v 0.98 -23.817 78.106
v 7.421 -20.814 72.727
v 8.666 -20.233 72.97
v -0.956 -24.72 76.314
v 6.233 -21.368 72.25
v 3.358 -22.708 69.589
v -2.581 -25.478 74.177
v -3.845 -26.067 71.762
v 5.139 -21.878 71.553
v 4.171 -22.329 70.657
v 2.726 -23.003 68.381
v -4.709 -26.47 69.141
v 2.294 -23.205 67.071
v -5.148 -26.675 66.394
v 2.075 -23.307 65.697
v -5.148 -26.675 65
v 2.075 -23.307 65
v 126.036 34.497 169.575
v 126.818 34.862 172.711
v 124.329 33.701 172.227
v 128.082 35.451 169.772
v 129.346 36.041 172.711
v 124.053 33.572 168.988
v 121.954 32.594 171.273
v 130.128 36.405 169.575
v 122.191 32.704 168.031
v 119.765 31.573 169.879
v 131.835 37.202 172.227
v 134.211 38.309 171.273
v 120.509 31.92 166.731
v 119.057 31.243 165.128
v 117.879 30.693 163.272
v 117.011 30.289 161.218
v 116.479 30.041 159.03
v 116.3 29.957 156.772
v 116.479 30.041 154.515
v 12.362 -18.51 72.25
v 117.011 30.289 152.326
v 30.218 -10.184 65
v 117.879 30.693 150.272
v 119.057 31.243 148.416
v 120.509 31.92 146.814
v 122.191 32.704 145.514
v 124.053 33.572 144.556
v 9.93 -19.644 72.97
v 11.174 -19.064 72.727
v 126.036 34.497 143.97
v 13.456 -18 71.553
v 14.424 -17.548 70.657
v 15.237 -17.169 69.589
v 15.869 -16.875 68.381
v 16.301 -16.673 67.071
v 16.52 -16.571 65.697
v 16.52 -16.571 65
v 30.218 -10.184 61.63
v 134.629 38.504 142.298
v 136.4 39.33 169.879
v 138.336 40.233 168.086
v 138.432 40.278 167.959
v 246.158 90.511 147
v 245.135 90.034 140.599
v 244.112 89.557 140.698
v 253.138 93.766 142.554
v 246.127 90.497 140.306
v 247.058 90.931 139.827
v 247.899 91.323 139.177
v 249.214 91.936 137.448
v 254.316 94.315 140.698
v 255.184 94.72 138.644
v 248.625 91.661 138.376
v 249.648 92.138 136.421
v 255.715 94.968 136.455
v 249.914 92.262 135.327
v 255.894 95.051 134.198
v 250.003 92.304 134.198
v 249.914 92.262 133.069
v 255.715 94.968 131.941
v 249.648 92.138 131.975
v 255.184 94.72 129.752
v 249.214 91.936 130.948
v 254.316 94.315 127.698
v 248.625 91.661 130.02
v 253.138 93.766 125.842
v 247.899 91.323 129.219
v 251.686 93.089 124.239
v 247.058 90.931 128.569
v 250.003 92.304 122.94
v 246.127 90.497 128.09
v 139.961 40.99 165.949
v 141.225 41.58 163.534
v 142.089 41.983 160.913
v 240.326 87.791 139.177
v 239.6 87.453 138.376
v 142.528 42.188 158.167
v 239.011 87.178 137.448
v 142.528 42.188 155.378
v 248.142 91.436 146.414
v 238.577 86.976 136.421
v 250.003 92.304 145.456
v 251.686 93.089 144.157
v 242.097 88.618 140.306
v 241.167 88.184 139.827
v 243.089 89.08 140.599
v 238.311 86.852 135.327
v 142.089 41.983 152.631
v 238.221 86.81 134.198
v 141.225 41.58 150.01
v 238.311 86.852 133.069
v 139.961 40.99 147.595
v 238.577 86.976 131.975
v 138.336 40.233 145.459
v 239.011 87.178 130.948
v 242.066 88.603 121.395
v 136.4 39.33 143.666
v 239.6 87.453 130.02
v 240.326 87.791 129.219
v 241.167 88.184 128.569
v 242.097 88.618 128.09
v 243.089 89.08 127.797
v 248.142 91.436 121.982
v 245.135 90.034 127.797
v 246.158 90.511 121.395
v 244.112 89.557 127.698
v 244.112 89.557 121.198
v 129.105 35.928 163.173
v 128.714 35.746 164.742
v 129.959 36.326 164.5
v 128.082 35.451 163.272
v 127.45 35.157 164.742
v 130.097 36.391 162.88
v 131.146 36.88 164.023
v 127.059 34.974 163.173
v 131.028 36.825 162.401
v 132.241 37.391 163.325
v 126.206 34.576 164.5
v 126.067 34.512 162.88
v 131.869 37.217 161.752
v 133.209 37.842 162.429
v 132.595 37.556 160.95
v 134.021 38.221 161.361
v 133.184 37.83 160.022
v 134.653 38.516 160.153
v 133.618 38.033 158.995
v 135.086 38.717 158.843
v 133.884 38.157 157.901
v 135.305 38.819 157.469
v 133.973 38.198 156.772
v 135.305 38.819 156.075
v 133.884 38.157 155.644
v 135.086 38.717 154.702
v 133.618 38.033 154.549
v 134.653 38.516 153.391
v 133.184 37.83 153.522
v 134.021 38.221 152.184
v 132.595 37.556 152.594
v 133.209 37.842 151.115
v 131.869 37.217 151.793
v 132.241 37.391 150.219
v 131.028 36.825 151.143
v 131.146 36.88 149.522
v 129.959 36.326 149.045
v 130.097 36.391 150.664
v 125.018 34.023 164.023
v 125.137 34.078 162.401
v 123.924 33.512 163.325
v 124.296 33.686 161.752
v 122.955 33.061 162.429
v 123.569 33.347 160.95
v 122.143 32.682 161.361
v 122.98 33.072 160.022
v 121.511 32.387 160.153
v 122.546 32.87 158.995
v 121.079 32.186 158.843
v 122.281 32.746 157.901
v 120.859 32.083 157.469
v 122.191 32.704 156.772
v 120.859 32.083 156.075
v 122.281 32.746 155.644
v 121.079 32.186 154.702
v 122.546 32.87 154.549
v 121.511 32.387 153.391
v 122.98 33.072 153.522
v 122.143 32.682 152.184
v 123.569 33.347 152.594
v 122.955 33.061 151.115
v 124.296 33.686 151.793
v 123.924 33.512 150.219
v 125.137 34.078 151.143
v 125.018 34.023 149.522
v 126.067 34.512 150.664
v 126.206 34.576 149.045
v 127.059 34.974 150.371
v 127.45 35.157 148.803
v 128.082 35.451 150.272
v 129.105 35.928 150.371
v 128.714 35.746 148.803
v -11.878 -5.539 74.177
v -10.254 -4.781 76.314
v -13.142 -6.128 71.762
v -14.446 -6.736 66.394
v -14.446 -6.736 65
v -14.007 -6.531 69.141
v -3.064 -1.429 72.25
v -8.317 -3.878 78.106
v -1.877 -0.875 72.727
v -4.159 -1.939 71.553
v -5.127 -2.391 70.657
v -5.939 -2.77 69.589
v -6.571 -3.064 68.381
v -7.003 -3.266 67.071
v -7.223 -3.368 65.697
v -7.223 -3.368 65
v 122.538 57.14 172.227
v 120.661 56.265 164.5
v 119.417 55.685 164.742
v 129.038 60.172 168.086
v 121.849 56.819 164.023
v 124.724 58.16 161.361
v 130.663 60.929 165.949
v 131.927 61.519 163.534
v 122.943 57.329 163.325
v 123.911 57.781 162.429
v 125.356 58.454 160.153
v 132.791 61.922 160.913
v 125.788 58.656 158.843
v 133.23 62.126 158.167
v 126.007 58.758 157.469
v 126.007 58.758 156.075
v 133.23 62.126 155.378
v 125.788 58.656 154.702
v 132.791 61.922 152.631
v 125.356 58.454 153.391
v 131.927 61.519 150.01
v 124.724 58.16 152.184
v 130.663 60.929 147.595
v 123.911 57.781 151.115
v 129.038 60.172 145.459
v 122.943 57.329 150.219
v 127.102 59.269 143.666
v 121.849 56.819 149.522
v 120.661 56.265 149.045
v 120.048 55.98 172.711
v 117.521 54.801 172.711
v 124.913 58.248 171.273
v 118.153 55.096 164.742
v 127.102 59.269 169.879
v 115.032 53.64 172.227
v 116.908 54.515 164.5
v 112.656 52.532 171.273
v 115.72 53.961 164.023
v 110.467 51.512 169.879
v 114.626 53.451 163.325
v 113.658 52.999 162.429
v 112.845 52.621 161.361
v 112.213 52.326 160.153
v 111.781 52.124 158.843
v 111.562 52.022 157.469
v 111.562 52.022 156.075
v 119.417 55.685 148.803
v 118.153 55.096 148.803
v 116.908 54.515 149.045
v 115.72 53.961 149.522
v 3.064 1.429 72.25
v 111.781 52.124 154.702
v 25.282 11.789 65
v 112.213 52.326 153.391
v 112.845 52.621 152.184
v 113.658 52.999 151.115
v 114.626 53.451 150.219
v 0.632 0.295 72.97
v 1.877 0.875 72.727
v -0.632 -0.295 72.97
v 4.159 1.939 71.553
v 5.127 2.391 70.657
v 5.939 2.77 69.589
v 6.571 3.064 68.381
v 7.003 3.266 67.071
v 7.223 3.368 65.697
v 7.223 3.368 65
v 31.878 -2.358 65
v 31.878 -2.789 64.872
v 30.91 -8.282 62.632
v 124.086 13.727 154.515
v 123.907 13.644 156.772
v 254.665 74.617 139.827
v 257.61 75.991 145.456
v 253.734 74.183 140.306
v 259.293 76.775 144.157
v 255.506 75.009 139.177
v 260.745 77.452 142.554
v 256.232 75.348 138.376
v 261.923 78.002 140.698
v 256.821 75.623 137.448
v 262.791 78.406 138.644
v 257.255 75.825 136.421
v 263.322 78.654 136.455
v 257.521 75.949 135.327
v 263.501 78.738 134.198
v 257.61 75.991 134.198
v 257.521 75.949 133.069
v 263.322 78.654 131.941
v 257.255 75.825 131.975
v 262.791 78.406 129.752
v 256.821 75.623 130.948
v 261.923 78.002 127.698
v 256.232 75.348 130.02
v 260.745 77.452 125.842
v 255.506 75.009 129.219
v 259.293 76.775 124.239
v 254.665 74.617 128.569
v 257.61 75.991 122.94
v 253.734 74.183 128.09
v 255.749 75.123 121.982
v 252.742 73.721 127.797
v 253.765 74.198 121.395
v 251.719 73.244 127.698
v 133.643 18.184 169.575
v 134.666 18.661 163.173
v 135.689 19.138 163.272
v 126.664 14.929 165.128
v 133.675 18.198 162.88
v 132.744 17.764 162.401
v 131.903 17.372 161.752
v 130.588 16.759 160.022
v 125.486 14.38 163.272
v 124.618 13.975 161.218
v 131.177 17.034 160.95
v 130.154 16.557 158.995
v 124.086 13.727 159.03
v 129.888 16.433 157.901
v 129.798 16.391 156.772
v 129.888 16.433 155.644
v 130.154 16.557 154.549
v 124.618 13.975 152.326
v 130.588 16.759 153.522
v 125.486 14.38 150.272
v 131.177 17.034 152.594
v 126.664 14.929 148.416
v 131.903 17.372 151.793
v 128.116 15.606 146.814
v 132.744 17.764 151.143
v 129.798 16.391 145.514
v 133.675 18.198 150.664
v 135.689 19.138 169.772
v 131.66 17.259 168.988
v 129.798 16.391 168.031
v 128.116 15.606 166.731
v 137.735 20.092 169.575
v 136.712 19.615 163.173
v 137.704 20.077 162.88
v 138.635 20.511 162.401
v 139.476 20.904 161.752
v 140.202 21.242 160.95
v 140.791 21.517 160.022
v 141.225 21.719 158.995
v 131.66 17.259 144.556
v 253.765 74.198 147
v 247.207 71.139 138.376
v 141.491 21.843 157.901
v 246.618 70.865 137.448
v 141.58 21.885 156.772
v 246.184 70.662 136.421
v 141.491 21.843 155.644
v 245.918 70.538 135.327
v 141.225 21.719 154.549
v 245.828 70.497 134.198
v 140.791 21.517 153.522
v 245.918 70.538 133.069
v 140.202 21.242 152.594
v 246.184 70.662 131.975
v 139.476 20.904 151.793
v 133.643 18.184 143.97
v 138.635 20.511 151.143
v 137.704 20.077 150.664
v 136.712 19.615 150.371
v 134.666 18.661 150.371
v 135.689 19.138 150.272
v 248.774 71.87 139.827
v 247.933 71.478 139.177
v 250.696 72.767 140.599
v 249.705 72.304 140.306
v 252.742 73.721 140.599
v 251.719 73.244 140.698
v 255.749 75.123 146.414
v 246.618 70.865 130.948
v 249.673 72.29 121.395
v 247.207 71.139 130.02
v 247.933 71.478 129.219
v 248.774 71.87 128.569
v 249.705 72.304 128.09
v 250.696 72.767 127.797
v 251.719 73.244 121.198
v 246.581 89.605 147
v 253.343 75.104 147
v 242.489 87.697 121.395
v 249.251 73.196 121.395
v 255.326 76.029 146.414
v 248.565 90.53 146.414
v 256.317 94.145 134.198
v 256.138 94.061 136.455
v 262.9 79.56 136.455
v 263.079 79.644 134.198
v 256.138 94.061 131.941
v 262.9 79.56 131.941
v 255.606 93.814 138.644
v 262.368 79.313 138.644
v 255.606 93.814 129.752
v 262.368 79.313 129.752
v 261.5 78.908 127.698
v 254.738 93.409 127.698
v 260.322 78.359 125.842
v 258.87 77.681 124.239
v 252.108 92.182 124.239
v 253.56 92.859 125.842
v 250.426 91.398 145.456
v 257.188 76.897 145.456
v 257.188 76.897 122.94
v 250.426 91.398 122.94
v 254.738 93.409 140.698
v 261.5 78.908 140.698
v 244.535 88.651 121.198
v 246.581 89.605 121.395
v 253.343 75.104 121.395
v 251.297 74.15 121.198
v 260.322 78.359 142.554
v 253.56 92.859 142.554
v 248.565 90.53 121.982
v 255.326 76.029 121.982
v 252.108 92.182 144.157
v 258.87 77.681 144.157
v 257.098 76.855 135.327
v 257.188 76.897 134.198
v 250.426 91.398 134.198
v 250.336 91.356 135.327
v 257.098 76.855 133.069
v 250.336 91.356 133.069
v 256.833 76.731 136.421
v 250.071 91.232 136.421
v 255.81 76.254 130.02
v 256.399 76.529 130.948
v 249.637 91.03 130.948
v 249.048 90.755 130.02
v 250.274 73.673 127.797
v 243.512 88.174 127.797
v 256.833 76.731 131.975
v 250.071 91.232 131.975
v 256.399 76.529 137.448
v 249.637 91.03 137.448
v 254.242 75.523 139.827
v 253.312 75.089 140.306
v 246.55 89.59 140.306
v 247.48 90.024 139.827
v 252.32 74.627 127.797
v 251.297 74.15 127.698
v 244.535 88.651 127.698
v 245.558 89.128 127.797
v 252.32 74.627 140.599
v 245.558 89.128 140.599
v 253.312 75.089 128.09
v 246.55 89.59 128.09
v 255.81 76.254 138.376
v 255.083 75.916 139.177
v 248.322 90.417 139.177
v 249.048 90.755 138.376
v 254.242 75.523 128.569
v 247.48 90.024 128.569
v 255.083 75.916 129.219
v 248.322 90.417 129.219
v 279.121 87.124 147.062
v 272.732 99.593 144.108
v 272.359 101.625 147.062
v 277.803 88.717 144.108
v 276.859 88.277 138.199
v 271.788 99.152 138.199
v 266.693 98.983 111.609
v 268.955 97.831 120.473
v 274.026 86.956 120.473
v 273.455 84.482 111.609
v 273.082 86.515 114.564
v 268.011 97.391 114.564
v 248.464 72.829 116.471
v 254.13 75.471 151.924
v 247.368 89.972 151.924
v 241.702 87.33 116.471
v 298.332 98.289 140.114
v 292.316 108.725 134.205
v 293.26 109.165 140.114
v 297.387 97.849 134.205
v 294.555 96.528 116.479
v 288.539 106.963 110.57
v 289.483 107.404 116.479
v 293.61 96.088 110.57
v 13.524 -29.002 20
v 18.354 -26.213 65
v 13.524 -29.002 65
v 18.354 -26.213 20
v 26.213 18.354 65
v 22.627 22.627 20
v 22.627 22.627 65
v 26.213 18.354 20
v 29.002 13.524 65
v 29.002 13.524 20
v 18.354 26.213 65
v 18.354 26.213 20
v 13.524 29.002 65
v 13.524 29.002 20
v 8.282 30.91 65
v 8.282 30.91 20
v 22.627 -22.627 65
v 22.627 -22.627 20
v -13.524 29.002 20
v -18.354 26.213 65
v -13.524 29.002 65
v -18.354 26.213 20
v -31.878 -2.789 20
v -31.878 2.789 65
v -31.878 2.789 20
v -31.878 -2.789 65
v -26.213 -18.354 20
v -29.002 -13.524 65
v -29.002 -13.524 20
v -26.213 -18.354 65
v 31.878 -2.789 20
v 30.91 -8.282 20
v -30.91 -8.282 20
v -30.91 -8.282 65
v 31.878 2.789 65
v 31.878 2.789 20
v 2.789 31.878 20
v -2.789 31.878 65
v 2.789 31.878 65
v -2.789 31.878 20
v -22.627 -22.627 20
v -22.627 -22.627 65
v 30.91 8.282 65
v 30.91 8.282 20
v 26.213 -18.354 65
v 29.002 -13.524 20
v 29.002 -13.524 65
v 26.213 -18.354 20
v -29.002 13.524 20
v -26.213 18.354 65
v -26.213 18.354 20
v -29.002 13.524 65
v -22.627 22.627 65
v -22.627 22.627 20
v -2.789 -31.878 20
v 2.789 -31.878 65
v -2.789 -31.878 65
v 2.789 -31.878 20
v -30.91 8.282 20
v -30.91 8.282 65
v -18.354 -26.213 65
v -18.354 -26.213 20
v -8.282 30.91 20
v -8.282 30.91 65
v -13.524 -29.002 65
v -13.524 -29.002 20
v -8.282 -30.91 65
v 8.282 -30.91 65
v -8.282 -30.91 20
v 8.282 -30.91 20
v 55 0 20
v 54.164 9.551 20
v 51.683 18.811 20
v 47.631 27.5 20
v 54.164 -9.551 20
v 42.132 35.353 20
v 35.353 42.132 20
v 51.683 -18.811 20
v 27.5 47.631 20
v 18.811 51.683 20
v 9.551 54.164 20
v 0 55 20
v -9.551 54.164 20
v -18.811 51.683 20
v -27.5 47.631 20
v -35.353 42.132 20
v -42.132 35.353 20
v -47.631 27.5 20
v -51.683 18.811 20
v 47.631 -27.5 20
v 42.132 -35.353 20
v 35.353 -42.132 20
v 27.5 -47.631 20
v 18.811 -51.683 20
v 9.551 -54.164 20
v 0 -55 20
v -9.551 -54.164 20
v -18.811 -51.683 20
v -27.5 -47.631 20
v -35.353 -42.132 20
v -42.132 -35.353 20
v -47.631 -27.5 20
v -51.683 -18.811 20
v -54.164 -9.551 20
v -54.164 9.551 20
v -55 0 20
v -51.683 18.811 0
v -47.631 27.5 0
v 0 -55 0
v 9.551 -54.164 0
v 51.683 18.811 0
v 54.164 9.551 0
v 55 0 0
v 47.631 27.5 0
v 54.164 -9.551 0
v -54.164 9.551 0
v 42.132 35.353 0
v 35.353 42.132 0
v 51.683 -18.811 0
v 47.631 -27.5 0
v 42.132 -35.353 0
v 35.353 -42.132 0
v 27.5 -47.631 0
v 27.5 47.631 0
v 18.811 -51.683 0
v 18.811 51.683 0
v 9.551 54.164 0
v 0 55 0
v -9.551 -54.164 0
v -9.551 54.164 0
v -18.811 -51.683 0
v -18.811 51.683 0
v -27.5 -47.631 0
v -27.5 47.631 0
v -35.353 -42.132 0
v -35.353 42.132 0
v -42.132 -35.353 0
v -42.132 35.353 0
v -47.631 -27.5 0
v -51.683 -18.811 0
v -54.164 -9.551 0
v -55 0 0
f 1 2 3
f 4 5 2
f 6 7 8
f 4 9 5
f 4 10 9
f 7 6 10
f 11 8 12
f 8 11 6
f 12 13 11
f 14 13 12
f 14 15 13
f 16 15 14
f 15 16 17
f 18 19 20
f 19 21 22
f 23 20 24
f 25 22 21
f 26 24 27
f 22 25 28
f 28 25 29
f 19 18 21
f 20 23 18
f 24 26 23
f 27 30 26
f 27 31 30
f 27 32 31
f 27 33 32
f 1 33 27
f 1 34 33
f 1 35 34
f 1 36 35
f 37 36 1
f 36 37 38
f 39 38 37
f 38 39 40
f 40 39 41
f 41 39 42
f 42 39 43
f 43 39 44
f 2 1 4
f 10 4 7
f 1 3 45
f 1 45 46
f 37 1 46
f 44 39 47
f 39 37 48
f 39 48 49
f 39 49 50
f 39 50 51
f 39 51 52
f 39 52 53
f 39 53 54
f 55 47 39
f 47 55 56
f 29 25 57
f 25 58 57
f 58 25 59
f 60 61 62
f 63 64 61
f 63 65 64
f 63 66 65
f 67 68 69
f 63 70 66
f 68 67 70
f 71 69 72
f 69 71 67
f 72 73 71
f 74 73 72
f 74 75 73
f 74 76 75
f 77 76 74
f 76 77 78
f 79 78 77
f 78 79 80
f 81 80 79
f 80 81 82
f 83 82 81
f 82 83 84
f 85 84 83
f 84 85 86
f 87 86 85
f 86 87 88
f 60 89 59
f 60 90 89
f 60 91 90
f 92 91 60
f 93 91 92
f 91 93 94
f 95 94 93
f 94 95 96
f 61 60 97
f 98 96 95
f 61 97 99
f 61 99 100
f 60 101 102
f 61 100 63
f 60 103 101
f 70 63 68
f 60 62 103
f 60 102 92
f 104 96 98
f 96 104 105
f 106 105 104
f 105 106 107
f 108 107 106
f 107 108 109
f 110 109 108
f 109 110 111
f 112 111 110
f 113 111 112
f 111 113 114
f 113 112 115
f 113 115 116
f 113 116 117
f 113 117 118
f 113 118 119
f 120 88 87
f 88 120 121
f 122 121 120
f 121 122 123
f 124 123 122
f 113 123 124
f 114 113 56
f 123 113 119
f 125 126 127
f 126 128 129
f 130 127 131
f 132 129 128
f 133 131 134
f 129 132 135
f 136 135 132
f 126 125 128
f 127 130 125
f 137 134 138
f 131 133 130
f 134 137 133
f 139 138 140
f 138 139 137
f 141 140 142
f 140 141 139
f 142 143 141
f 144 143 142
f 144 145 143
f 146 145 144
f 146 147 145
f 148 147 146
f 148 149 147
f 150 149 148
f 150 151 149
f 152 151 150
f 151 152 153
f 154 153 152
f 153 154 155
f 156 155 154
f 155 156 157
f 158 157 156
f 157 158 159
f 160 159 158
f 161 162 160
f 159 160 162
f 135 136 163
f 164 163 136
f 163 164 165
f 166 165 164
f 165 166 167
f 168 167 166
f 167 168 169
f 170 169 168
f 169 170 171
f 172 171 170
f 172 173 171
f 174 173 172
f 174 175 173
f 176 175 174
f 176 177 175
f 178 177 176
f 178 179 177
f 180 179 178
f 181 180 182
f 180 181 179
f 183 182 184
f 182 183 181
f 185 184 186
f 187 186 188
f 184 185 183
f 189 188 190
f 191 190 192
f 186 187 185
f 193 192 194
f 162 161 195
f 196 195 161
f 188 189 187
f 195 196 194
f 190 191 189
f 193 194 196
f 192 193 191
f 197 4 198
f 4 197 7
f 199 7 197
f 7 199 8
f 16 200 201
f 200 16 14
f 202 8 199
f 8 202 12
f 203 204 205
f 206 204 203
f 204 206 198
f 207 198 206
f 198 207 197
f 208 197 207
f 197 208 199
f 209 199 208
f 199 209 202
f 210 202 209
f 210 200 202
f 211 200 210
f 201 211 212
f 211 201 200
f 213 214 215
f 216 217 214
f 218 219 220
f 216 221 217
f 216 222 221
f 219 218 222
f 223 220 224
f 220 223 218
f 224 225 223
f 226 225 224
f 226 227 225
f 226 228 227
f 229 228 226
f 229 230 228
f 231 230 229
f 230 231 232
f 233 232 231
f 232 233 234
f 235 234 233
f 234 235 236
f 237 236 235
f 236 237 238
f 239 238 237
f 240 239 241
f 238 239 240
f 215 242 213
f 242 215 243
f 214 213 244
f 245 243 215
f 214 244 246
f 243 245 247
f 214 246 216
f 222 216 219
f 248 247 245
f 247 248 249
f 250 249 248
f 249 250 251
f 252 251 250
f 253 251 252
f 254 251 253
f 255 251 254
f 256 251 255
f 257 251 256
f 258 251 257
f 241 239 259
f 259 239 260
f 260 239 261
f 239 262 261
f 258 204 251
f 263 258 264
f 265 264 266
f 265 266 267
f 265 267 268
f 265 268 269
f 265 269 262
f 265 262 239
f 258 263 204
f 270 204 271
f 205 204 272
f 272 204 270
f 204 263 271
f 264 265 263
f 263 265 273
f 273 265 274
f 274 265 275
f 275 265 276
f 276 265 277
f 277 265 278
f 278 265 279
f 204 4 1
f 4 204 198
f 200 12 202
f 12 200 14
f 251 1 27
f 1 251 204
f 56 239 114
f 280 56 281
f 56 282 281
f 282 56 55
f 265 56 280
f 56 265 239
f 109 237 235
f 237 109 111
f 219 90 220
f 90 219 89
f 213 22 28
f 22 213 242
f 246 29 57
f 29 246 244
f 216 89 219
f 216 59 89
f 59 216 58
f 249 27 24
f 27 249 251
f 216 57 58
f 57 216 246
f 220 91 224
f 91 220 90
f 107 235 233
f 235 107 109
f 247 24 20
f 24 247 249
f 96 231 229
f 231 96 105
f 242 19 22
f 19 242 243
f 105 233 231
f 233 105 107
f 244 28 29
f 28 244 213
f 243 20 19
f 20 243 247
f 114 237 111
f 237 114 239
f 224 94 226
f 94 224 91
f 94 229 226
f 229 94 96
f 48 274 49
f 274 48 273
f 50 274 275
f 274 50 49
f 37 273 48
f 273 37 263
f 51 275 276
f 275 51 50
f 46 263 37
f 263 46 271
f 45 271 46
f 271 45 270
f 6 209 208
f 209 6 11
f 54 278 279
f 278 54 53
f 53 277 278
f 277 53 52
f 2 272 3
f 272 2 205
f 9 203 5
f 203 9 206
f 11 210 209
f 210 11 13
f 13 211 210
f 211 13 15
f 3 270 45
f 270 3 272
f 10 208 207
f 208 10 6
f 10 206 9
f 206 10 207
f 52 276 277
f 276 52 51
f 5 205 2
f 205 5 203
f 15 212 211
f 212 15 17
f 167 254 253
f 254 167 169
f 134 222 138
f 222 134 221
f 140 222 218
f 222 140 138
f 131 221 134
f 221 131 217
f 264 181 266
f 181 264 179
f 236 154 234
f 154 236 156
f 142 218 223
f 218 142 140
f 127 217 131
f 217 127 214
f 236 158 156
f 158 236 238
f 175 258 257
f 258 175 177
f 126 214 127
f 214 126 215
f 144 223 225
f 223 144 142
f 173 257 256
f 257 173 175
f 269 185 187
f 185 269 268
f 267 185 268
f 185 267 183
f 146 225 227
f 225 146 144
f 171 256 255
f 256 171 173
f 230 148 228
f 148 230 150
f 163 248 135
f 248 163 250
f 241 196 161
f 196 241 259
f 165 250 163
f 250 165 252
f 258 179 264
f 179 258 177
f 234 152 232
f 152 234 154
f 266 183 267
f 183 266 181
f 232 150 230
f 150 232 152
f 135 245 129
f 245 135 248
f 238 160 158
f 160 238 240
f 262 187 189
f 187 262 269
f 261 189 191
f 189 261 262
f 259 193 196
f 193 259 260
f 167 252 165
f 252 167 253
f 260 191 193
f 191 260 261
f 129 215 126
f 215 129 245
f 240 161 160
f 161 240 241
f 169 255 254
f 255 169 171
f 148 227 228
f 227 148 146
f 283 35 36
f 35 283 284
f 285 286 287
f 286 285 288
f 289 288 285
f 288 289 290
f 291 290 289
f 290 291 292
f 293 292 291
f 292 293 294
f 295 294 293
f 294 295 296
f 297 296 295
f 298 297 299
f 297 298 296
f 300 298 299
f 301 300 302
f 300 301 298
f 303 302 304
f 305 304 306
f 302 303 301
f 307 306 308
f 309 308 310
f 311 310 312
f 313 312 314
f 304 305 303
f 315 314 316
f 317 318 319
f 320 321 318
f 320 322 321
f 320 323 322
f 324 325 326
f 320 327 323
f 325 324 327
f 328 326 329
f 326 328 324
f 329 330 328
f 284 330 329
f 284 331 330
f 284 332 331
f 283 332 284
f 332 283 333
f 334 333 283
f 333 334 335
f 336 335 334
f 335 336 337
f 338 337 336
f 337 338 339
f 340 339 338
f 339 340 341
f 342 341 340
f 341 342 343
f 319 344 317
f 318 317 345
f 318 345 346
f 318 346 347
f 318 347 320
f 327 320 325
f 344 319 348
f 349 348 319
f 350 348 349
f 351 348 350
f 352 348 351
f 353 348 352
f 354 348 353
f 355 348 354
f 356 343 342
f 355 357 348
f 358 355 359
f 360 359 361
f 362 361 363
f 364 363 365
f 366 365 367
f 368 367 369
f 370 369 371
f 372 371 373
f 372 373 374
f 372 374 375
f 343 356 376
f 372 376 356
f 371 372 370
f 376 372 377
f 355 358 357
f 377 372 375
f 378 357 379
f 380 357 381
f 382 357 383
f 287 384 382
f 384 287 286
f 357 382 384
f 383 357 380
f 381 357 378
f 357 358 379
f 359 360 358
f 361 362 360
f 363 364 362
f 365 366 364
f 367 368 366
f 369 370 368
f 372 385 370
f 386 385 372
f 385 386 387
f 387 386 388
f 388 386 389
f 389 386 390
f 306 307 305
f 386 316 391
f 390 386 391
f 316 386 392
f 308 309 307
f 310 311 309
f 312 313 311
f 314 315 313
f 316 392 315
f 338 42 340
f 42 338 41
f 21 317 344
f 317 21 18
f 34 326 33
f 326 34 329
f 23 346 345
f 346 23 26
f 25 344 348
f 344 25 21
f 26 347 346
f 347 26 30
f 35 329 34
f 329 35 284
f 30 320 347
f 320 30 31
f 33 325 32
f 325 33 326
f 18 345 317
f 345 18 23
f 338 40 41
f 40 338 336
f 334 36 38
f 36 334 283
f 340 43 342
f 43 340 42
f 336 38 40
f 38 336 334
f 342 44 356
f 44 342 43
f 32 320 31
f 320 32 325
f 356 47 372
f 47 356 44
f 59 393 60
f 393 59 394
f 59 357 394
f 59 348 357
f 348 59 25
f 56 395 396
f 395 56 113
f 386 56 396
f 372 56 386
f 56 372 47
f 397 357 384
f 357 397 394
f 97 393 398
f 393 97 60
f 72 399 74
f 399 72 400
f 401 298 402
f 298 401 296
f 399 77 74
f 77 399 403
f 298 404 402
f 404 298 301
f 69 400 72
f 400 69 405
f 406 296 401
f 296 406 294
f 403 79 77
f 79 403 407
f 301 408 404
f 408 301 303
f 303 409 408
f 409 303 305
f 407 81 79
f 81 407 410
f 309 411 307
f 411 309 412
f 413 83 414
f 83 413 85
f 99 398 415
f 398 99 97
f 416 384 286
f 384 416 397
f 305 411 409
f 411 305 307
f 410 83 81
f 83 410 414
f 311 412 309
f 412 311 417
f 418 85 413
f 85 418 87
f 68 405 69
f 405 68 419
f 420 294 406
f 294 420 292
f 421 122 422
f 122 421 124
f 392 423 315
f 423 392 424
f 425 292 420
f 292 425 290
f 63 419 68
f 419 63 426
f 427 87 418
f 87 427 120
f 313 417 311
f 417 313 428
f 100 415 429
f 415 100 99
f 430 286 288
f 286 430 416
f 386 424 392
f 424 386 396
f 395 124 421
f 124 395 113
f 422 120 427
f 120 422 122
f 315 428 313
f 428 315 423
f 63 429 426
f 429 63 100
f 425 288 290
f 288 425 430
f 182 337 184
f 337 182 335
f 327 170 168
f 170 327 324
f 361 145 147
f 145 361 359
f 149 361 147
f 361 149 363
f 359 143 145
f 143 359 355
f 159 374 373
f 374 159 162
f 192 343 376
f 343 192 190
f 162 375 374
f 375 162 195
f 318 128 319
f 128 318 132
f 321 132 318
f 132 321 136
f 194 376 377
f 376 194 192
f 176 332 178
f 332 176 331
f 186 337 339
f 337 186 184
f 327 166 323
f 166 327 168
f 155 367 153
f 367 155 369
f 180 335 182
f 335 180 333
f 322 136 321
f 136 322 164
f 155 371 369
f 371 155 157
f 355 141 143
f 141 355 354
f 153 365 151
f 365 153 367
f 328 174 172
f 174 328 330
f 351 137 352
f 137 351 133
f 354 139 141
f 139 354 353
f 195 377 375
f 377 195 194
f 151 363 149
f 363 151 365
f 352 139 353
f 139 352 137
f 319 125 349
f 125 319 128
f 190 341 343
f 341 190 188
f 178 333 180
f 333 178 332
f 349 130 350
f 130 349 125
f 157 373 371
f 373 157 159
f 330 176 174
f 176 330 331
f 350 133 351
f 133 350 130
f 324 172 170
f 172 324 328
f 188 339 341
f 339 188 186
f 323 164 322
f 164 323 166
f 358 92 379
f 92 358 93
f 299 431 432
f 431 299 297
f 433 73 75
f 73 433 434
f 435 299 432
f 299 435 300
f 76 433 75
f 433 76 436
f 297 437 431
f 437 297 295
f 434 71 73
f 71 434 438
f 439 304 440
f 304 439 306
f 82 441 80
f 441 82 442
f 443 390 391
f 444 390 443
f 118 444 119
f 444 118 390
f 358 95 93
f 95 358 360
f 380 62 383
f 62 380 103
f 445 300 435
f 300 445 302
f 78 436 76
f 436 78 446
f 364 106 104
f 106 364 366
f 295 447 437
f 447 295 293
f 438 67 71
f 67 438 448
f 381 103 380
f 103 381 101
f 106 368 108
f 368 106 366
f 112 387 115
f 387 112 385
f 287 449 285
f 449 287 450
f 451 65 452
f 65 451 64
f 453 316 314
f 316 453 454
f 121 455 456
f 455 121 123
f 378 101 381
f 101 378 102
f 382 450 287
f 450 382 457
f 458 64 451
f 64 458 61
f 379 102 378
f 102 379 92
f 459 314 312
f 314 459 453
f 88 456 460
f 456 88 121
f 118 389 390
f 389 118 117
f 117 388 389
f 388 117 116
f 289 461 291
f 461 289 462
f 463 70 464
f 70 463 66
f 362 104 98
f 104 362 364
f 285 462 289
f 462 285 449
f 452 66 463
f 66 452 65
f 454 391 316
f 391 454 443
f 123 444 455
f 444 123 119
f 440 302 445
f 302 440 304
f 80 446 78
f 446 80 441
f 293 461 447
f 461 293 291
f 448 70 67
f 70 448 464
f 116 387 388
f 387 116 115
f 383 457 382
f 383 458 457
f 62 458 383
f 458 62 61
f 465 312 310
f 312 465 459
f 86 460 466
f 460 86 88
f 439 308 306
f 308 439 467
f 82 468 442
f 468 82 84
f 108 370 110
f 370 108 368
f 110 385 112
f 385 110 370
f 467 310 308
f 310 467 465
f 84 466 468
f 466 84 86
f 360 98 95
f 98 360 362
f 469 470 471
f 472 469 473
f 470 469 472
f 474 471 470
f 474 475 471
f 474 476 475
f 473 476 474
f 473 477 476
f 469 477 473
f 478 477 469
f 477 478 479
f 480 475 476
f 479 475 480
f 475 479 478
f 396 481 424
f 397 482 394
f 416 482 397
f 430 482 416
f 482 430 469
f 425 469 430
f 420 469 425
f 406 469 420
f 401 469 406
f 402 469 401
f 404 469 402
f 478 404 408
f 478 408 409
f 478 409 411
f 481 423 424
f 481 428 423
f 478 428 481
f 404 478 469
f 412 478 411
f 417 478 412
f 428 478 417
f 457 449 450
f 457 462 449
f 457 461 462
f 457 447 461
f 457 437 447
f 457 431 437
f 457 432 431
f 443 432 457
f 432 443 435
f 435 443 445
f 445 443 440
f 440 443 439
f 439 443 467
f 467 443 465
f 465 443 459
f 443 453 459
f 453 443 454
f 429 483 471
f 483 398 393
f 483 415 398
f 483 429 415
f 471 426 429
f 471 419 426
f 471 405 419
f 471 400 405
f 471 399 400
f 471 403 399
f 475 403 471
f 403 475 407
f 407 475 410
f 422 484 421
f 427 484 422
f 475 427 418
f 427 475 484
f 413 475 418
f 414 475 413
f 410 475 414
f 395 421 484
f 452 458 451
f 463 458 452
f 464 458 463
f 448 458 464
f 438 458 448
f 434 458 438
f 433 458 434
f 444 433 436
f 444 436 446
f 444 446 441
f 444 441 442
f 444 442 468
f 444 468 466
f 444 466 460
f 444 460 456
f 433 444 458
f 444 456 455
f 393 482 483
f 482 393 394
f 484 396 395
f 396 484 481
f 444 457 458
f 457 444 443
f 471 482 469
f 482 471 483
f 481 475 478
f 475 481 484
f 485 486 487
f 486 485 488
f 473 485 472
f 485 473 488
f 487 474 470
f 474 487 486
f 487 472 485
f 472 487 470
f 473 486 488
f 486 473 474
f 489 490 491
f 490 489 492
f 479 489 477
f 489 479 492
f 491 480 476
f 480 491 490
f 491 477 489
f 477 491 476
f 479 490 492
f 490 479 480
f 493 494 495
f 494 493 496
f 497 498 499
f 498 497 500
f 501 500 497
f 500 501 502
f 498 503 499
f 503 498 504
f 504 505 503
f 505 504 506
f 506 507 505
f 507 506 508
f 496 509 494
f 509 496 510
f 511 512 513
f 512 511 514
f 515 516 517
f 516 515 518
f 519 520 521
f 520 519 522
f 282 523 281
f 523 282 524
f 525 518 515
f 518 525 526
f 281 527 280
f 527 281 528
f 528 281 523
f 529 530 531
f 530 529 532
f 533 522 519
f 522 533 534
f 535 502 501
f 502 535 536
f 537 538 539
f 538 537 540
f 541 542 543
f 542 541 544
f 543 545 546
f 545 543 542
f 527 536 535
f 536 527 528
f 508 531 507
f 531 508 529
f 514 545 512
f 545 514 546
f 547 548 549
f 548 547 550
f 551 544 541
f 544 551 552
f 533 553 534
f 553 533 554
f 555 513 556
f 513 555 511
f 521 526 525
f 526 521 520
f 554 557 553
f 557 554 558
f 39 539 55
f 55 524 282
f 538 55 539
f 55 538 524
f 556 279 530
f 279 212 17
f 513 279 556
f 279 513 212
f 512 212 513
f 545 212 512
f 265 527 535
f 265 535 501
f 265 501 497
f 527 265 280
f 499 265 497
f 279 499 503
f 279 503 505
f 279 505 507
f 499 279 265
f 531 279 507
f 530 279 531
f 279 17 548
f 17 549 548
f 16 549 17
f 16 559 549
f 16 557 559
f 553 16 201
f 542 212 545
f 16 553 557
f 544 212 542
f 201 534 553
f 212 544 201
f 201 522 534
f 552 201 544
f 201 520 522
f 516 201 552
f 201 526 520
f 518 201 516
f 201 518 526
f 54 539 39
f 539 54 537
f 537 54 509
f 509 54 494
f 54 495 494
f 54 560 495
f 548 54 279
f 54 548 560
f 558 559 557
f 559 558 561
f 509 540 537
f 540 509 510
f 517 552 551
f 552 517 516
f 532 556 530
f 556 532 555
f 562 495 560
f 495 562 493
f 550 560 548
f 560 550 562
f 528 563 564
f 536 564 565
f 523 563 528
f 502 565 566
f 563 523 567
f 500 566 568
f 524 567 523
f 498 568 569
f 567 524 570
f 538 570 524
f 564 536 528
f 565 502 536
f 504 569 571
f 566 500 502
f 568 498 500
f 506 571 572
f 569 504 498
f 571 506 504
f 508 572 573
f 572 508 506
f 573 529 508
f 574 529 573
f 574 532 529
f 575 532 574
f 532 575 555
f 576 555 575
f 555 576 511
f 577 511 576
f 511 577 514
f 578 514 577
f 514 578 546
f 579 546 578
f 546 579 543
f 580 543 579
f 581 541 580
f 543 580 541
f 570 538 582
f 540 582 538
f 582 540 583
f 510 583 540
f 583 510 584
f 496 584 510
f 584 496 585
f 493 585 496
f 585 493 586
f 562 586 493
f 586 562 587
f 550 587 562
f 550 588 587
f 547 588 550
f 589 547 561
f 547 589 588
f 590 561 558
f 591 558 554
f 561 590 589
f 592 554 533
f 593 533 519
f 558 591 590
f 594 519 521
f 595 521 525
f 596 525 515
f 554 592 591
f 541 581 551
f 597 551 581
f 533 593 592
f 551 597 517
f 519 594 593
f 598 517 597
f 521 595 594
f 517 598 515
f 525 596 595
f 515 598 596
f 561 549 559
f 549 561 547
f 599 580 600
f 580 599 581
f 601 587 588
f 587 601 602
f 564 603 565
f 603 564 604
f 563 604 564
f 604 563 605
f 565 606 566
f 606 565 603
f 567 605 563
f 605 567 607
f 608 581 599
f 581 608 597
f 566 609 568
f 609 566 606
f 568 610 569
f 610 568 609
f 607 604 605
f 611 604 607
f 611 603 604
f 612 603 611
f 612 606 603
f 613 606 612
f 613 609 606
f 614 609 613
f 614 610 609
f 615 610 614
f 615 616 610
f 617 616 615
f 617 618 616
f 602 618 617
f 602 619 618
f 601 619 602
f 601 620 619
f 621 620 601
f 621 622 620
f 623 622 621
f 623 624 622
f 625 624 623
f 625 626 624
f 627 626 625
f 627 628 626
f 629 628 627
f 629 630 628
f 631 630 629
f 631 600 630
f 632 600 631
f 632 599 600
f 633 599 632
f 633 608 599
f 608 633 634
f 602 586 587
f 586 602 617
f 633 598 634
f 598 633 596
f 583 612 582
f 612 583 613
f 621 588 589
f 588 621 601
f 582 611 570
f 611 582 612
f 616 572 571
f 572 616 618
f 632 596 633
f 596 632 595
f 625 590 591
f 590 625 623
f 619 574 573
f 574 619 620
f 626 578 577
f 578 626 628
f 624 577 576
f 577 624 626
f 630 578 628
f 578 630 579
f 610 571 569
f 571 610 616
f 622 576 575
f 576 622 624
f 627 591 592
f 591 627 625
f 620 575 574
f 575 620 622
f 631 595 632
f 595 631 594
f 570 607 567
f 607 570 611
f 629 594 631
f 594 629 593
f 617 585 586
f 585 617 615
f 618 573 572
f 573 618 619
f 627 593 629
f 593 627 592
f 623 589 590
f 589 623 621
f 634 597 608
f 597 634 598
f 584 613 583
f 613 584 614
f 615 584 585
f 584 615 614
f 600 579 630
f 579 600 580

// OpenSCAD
// Articulated 3-DOF Industrial Robotic Arm (mm)
$fn = 36;

base_angle = 25;
shoulder_angle = 35;
elbow_angle = -45;
link1_len = 160;
link2_len = 130;

module arm_link(length, width, thickness) {
  difference() {
    union() {
      cylinder(r = width / 2, h = thickness);
      translate([0, -width / 2, 0])
        cube([length, width, thickness]);
      translate([length, 0, 0])
        cylinder(r = width / 2, h = thickness);
    }
    translate([0, 0, -1])
      cylinder(r = width * 0.25, h = thickness + 2);
    translate([length, 0, -1])
      cylinder(r = width * 0.25, h = thickness + 2);
  }
}

module parallel_gripper() {
  cube([28, 36, 16], center = true);
  translate([24, 12, 0])
    cube([26, 6, 12], center = true);
  translate([24, -12, 0])
    cube([26, 6, 12], center = true);
}

module robot_arm() {
  cylinder(r = 55, h = 20);
  translate([0, 0, 20])
    rotate([0, 0, base_angle]) {
      cylinder(r = 32, h = 45);
      translate([0, 0, 45])
        rotate([90, -shoulder_angle, 0]) {
          arm_link(link1_len, 32, 22);
          translate([link1_len, 0, 22])
            rotate([0, 0, elbow_angle]) {
              arm_link(link2_len, 26, 18);
              translate([link2_len + 14, 0, 9])
                parallel_gripper();
            }
        }
    }
}

robot_arm();
